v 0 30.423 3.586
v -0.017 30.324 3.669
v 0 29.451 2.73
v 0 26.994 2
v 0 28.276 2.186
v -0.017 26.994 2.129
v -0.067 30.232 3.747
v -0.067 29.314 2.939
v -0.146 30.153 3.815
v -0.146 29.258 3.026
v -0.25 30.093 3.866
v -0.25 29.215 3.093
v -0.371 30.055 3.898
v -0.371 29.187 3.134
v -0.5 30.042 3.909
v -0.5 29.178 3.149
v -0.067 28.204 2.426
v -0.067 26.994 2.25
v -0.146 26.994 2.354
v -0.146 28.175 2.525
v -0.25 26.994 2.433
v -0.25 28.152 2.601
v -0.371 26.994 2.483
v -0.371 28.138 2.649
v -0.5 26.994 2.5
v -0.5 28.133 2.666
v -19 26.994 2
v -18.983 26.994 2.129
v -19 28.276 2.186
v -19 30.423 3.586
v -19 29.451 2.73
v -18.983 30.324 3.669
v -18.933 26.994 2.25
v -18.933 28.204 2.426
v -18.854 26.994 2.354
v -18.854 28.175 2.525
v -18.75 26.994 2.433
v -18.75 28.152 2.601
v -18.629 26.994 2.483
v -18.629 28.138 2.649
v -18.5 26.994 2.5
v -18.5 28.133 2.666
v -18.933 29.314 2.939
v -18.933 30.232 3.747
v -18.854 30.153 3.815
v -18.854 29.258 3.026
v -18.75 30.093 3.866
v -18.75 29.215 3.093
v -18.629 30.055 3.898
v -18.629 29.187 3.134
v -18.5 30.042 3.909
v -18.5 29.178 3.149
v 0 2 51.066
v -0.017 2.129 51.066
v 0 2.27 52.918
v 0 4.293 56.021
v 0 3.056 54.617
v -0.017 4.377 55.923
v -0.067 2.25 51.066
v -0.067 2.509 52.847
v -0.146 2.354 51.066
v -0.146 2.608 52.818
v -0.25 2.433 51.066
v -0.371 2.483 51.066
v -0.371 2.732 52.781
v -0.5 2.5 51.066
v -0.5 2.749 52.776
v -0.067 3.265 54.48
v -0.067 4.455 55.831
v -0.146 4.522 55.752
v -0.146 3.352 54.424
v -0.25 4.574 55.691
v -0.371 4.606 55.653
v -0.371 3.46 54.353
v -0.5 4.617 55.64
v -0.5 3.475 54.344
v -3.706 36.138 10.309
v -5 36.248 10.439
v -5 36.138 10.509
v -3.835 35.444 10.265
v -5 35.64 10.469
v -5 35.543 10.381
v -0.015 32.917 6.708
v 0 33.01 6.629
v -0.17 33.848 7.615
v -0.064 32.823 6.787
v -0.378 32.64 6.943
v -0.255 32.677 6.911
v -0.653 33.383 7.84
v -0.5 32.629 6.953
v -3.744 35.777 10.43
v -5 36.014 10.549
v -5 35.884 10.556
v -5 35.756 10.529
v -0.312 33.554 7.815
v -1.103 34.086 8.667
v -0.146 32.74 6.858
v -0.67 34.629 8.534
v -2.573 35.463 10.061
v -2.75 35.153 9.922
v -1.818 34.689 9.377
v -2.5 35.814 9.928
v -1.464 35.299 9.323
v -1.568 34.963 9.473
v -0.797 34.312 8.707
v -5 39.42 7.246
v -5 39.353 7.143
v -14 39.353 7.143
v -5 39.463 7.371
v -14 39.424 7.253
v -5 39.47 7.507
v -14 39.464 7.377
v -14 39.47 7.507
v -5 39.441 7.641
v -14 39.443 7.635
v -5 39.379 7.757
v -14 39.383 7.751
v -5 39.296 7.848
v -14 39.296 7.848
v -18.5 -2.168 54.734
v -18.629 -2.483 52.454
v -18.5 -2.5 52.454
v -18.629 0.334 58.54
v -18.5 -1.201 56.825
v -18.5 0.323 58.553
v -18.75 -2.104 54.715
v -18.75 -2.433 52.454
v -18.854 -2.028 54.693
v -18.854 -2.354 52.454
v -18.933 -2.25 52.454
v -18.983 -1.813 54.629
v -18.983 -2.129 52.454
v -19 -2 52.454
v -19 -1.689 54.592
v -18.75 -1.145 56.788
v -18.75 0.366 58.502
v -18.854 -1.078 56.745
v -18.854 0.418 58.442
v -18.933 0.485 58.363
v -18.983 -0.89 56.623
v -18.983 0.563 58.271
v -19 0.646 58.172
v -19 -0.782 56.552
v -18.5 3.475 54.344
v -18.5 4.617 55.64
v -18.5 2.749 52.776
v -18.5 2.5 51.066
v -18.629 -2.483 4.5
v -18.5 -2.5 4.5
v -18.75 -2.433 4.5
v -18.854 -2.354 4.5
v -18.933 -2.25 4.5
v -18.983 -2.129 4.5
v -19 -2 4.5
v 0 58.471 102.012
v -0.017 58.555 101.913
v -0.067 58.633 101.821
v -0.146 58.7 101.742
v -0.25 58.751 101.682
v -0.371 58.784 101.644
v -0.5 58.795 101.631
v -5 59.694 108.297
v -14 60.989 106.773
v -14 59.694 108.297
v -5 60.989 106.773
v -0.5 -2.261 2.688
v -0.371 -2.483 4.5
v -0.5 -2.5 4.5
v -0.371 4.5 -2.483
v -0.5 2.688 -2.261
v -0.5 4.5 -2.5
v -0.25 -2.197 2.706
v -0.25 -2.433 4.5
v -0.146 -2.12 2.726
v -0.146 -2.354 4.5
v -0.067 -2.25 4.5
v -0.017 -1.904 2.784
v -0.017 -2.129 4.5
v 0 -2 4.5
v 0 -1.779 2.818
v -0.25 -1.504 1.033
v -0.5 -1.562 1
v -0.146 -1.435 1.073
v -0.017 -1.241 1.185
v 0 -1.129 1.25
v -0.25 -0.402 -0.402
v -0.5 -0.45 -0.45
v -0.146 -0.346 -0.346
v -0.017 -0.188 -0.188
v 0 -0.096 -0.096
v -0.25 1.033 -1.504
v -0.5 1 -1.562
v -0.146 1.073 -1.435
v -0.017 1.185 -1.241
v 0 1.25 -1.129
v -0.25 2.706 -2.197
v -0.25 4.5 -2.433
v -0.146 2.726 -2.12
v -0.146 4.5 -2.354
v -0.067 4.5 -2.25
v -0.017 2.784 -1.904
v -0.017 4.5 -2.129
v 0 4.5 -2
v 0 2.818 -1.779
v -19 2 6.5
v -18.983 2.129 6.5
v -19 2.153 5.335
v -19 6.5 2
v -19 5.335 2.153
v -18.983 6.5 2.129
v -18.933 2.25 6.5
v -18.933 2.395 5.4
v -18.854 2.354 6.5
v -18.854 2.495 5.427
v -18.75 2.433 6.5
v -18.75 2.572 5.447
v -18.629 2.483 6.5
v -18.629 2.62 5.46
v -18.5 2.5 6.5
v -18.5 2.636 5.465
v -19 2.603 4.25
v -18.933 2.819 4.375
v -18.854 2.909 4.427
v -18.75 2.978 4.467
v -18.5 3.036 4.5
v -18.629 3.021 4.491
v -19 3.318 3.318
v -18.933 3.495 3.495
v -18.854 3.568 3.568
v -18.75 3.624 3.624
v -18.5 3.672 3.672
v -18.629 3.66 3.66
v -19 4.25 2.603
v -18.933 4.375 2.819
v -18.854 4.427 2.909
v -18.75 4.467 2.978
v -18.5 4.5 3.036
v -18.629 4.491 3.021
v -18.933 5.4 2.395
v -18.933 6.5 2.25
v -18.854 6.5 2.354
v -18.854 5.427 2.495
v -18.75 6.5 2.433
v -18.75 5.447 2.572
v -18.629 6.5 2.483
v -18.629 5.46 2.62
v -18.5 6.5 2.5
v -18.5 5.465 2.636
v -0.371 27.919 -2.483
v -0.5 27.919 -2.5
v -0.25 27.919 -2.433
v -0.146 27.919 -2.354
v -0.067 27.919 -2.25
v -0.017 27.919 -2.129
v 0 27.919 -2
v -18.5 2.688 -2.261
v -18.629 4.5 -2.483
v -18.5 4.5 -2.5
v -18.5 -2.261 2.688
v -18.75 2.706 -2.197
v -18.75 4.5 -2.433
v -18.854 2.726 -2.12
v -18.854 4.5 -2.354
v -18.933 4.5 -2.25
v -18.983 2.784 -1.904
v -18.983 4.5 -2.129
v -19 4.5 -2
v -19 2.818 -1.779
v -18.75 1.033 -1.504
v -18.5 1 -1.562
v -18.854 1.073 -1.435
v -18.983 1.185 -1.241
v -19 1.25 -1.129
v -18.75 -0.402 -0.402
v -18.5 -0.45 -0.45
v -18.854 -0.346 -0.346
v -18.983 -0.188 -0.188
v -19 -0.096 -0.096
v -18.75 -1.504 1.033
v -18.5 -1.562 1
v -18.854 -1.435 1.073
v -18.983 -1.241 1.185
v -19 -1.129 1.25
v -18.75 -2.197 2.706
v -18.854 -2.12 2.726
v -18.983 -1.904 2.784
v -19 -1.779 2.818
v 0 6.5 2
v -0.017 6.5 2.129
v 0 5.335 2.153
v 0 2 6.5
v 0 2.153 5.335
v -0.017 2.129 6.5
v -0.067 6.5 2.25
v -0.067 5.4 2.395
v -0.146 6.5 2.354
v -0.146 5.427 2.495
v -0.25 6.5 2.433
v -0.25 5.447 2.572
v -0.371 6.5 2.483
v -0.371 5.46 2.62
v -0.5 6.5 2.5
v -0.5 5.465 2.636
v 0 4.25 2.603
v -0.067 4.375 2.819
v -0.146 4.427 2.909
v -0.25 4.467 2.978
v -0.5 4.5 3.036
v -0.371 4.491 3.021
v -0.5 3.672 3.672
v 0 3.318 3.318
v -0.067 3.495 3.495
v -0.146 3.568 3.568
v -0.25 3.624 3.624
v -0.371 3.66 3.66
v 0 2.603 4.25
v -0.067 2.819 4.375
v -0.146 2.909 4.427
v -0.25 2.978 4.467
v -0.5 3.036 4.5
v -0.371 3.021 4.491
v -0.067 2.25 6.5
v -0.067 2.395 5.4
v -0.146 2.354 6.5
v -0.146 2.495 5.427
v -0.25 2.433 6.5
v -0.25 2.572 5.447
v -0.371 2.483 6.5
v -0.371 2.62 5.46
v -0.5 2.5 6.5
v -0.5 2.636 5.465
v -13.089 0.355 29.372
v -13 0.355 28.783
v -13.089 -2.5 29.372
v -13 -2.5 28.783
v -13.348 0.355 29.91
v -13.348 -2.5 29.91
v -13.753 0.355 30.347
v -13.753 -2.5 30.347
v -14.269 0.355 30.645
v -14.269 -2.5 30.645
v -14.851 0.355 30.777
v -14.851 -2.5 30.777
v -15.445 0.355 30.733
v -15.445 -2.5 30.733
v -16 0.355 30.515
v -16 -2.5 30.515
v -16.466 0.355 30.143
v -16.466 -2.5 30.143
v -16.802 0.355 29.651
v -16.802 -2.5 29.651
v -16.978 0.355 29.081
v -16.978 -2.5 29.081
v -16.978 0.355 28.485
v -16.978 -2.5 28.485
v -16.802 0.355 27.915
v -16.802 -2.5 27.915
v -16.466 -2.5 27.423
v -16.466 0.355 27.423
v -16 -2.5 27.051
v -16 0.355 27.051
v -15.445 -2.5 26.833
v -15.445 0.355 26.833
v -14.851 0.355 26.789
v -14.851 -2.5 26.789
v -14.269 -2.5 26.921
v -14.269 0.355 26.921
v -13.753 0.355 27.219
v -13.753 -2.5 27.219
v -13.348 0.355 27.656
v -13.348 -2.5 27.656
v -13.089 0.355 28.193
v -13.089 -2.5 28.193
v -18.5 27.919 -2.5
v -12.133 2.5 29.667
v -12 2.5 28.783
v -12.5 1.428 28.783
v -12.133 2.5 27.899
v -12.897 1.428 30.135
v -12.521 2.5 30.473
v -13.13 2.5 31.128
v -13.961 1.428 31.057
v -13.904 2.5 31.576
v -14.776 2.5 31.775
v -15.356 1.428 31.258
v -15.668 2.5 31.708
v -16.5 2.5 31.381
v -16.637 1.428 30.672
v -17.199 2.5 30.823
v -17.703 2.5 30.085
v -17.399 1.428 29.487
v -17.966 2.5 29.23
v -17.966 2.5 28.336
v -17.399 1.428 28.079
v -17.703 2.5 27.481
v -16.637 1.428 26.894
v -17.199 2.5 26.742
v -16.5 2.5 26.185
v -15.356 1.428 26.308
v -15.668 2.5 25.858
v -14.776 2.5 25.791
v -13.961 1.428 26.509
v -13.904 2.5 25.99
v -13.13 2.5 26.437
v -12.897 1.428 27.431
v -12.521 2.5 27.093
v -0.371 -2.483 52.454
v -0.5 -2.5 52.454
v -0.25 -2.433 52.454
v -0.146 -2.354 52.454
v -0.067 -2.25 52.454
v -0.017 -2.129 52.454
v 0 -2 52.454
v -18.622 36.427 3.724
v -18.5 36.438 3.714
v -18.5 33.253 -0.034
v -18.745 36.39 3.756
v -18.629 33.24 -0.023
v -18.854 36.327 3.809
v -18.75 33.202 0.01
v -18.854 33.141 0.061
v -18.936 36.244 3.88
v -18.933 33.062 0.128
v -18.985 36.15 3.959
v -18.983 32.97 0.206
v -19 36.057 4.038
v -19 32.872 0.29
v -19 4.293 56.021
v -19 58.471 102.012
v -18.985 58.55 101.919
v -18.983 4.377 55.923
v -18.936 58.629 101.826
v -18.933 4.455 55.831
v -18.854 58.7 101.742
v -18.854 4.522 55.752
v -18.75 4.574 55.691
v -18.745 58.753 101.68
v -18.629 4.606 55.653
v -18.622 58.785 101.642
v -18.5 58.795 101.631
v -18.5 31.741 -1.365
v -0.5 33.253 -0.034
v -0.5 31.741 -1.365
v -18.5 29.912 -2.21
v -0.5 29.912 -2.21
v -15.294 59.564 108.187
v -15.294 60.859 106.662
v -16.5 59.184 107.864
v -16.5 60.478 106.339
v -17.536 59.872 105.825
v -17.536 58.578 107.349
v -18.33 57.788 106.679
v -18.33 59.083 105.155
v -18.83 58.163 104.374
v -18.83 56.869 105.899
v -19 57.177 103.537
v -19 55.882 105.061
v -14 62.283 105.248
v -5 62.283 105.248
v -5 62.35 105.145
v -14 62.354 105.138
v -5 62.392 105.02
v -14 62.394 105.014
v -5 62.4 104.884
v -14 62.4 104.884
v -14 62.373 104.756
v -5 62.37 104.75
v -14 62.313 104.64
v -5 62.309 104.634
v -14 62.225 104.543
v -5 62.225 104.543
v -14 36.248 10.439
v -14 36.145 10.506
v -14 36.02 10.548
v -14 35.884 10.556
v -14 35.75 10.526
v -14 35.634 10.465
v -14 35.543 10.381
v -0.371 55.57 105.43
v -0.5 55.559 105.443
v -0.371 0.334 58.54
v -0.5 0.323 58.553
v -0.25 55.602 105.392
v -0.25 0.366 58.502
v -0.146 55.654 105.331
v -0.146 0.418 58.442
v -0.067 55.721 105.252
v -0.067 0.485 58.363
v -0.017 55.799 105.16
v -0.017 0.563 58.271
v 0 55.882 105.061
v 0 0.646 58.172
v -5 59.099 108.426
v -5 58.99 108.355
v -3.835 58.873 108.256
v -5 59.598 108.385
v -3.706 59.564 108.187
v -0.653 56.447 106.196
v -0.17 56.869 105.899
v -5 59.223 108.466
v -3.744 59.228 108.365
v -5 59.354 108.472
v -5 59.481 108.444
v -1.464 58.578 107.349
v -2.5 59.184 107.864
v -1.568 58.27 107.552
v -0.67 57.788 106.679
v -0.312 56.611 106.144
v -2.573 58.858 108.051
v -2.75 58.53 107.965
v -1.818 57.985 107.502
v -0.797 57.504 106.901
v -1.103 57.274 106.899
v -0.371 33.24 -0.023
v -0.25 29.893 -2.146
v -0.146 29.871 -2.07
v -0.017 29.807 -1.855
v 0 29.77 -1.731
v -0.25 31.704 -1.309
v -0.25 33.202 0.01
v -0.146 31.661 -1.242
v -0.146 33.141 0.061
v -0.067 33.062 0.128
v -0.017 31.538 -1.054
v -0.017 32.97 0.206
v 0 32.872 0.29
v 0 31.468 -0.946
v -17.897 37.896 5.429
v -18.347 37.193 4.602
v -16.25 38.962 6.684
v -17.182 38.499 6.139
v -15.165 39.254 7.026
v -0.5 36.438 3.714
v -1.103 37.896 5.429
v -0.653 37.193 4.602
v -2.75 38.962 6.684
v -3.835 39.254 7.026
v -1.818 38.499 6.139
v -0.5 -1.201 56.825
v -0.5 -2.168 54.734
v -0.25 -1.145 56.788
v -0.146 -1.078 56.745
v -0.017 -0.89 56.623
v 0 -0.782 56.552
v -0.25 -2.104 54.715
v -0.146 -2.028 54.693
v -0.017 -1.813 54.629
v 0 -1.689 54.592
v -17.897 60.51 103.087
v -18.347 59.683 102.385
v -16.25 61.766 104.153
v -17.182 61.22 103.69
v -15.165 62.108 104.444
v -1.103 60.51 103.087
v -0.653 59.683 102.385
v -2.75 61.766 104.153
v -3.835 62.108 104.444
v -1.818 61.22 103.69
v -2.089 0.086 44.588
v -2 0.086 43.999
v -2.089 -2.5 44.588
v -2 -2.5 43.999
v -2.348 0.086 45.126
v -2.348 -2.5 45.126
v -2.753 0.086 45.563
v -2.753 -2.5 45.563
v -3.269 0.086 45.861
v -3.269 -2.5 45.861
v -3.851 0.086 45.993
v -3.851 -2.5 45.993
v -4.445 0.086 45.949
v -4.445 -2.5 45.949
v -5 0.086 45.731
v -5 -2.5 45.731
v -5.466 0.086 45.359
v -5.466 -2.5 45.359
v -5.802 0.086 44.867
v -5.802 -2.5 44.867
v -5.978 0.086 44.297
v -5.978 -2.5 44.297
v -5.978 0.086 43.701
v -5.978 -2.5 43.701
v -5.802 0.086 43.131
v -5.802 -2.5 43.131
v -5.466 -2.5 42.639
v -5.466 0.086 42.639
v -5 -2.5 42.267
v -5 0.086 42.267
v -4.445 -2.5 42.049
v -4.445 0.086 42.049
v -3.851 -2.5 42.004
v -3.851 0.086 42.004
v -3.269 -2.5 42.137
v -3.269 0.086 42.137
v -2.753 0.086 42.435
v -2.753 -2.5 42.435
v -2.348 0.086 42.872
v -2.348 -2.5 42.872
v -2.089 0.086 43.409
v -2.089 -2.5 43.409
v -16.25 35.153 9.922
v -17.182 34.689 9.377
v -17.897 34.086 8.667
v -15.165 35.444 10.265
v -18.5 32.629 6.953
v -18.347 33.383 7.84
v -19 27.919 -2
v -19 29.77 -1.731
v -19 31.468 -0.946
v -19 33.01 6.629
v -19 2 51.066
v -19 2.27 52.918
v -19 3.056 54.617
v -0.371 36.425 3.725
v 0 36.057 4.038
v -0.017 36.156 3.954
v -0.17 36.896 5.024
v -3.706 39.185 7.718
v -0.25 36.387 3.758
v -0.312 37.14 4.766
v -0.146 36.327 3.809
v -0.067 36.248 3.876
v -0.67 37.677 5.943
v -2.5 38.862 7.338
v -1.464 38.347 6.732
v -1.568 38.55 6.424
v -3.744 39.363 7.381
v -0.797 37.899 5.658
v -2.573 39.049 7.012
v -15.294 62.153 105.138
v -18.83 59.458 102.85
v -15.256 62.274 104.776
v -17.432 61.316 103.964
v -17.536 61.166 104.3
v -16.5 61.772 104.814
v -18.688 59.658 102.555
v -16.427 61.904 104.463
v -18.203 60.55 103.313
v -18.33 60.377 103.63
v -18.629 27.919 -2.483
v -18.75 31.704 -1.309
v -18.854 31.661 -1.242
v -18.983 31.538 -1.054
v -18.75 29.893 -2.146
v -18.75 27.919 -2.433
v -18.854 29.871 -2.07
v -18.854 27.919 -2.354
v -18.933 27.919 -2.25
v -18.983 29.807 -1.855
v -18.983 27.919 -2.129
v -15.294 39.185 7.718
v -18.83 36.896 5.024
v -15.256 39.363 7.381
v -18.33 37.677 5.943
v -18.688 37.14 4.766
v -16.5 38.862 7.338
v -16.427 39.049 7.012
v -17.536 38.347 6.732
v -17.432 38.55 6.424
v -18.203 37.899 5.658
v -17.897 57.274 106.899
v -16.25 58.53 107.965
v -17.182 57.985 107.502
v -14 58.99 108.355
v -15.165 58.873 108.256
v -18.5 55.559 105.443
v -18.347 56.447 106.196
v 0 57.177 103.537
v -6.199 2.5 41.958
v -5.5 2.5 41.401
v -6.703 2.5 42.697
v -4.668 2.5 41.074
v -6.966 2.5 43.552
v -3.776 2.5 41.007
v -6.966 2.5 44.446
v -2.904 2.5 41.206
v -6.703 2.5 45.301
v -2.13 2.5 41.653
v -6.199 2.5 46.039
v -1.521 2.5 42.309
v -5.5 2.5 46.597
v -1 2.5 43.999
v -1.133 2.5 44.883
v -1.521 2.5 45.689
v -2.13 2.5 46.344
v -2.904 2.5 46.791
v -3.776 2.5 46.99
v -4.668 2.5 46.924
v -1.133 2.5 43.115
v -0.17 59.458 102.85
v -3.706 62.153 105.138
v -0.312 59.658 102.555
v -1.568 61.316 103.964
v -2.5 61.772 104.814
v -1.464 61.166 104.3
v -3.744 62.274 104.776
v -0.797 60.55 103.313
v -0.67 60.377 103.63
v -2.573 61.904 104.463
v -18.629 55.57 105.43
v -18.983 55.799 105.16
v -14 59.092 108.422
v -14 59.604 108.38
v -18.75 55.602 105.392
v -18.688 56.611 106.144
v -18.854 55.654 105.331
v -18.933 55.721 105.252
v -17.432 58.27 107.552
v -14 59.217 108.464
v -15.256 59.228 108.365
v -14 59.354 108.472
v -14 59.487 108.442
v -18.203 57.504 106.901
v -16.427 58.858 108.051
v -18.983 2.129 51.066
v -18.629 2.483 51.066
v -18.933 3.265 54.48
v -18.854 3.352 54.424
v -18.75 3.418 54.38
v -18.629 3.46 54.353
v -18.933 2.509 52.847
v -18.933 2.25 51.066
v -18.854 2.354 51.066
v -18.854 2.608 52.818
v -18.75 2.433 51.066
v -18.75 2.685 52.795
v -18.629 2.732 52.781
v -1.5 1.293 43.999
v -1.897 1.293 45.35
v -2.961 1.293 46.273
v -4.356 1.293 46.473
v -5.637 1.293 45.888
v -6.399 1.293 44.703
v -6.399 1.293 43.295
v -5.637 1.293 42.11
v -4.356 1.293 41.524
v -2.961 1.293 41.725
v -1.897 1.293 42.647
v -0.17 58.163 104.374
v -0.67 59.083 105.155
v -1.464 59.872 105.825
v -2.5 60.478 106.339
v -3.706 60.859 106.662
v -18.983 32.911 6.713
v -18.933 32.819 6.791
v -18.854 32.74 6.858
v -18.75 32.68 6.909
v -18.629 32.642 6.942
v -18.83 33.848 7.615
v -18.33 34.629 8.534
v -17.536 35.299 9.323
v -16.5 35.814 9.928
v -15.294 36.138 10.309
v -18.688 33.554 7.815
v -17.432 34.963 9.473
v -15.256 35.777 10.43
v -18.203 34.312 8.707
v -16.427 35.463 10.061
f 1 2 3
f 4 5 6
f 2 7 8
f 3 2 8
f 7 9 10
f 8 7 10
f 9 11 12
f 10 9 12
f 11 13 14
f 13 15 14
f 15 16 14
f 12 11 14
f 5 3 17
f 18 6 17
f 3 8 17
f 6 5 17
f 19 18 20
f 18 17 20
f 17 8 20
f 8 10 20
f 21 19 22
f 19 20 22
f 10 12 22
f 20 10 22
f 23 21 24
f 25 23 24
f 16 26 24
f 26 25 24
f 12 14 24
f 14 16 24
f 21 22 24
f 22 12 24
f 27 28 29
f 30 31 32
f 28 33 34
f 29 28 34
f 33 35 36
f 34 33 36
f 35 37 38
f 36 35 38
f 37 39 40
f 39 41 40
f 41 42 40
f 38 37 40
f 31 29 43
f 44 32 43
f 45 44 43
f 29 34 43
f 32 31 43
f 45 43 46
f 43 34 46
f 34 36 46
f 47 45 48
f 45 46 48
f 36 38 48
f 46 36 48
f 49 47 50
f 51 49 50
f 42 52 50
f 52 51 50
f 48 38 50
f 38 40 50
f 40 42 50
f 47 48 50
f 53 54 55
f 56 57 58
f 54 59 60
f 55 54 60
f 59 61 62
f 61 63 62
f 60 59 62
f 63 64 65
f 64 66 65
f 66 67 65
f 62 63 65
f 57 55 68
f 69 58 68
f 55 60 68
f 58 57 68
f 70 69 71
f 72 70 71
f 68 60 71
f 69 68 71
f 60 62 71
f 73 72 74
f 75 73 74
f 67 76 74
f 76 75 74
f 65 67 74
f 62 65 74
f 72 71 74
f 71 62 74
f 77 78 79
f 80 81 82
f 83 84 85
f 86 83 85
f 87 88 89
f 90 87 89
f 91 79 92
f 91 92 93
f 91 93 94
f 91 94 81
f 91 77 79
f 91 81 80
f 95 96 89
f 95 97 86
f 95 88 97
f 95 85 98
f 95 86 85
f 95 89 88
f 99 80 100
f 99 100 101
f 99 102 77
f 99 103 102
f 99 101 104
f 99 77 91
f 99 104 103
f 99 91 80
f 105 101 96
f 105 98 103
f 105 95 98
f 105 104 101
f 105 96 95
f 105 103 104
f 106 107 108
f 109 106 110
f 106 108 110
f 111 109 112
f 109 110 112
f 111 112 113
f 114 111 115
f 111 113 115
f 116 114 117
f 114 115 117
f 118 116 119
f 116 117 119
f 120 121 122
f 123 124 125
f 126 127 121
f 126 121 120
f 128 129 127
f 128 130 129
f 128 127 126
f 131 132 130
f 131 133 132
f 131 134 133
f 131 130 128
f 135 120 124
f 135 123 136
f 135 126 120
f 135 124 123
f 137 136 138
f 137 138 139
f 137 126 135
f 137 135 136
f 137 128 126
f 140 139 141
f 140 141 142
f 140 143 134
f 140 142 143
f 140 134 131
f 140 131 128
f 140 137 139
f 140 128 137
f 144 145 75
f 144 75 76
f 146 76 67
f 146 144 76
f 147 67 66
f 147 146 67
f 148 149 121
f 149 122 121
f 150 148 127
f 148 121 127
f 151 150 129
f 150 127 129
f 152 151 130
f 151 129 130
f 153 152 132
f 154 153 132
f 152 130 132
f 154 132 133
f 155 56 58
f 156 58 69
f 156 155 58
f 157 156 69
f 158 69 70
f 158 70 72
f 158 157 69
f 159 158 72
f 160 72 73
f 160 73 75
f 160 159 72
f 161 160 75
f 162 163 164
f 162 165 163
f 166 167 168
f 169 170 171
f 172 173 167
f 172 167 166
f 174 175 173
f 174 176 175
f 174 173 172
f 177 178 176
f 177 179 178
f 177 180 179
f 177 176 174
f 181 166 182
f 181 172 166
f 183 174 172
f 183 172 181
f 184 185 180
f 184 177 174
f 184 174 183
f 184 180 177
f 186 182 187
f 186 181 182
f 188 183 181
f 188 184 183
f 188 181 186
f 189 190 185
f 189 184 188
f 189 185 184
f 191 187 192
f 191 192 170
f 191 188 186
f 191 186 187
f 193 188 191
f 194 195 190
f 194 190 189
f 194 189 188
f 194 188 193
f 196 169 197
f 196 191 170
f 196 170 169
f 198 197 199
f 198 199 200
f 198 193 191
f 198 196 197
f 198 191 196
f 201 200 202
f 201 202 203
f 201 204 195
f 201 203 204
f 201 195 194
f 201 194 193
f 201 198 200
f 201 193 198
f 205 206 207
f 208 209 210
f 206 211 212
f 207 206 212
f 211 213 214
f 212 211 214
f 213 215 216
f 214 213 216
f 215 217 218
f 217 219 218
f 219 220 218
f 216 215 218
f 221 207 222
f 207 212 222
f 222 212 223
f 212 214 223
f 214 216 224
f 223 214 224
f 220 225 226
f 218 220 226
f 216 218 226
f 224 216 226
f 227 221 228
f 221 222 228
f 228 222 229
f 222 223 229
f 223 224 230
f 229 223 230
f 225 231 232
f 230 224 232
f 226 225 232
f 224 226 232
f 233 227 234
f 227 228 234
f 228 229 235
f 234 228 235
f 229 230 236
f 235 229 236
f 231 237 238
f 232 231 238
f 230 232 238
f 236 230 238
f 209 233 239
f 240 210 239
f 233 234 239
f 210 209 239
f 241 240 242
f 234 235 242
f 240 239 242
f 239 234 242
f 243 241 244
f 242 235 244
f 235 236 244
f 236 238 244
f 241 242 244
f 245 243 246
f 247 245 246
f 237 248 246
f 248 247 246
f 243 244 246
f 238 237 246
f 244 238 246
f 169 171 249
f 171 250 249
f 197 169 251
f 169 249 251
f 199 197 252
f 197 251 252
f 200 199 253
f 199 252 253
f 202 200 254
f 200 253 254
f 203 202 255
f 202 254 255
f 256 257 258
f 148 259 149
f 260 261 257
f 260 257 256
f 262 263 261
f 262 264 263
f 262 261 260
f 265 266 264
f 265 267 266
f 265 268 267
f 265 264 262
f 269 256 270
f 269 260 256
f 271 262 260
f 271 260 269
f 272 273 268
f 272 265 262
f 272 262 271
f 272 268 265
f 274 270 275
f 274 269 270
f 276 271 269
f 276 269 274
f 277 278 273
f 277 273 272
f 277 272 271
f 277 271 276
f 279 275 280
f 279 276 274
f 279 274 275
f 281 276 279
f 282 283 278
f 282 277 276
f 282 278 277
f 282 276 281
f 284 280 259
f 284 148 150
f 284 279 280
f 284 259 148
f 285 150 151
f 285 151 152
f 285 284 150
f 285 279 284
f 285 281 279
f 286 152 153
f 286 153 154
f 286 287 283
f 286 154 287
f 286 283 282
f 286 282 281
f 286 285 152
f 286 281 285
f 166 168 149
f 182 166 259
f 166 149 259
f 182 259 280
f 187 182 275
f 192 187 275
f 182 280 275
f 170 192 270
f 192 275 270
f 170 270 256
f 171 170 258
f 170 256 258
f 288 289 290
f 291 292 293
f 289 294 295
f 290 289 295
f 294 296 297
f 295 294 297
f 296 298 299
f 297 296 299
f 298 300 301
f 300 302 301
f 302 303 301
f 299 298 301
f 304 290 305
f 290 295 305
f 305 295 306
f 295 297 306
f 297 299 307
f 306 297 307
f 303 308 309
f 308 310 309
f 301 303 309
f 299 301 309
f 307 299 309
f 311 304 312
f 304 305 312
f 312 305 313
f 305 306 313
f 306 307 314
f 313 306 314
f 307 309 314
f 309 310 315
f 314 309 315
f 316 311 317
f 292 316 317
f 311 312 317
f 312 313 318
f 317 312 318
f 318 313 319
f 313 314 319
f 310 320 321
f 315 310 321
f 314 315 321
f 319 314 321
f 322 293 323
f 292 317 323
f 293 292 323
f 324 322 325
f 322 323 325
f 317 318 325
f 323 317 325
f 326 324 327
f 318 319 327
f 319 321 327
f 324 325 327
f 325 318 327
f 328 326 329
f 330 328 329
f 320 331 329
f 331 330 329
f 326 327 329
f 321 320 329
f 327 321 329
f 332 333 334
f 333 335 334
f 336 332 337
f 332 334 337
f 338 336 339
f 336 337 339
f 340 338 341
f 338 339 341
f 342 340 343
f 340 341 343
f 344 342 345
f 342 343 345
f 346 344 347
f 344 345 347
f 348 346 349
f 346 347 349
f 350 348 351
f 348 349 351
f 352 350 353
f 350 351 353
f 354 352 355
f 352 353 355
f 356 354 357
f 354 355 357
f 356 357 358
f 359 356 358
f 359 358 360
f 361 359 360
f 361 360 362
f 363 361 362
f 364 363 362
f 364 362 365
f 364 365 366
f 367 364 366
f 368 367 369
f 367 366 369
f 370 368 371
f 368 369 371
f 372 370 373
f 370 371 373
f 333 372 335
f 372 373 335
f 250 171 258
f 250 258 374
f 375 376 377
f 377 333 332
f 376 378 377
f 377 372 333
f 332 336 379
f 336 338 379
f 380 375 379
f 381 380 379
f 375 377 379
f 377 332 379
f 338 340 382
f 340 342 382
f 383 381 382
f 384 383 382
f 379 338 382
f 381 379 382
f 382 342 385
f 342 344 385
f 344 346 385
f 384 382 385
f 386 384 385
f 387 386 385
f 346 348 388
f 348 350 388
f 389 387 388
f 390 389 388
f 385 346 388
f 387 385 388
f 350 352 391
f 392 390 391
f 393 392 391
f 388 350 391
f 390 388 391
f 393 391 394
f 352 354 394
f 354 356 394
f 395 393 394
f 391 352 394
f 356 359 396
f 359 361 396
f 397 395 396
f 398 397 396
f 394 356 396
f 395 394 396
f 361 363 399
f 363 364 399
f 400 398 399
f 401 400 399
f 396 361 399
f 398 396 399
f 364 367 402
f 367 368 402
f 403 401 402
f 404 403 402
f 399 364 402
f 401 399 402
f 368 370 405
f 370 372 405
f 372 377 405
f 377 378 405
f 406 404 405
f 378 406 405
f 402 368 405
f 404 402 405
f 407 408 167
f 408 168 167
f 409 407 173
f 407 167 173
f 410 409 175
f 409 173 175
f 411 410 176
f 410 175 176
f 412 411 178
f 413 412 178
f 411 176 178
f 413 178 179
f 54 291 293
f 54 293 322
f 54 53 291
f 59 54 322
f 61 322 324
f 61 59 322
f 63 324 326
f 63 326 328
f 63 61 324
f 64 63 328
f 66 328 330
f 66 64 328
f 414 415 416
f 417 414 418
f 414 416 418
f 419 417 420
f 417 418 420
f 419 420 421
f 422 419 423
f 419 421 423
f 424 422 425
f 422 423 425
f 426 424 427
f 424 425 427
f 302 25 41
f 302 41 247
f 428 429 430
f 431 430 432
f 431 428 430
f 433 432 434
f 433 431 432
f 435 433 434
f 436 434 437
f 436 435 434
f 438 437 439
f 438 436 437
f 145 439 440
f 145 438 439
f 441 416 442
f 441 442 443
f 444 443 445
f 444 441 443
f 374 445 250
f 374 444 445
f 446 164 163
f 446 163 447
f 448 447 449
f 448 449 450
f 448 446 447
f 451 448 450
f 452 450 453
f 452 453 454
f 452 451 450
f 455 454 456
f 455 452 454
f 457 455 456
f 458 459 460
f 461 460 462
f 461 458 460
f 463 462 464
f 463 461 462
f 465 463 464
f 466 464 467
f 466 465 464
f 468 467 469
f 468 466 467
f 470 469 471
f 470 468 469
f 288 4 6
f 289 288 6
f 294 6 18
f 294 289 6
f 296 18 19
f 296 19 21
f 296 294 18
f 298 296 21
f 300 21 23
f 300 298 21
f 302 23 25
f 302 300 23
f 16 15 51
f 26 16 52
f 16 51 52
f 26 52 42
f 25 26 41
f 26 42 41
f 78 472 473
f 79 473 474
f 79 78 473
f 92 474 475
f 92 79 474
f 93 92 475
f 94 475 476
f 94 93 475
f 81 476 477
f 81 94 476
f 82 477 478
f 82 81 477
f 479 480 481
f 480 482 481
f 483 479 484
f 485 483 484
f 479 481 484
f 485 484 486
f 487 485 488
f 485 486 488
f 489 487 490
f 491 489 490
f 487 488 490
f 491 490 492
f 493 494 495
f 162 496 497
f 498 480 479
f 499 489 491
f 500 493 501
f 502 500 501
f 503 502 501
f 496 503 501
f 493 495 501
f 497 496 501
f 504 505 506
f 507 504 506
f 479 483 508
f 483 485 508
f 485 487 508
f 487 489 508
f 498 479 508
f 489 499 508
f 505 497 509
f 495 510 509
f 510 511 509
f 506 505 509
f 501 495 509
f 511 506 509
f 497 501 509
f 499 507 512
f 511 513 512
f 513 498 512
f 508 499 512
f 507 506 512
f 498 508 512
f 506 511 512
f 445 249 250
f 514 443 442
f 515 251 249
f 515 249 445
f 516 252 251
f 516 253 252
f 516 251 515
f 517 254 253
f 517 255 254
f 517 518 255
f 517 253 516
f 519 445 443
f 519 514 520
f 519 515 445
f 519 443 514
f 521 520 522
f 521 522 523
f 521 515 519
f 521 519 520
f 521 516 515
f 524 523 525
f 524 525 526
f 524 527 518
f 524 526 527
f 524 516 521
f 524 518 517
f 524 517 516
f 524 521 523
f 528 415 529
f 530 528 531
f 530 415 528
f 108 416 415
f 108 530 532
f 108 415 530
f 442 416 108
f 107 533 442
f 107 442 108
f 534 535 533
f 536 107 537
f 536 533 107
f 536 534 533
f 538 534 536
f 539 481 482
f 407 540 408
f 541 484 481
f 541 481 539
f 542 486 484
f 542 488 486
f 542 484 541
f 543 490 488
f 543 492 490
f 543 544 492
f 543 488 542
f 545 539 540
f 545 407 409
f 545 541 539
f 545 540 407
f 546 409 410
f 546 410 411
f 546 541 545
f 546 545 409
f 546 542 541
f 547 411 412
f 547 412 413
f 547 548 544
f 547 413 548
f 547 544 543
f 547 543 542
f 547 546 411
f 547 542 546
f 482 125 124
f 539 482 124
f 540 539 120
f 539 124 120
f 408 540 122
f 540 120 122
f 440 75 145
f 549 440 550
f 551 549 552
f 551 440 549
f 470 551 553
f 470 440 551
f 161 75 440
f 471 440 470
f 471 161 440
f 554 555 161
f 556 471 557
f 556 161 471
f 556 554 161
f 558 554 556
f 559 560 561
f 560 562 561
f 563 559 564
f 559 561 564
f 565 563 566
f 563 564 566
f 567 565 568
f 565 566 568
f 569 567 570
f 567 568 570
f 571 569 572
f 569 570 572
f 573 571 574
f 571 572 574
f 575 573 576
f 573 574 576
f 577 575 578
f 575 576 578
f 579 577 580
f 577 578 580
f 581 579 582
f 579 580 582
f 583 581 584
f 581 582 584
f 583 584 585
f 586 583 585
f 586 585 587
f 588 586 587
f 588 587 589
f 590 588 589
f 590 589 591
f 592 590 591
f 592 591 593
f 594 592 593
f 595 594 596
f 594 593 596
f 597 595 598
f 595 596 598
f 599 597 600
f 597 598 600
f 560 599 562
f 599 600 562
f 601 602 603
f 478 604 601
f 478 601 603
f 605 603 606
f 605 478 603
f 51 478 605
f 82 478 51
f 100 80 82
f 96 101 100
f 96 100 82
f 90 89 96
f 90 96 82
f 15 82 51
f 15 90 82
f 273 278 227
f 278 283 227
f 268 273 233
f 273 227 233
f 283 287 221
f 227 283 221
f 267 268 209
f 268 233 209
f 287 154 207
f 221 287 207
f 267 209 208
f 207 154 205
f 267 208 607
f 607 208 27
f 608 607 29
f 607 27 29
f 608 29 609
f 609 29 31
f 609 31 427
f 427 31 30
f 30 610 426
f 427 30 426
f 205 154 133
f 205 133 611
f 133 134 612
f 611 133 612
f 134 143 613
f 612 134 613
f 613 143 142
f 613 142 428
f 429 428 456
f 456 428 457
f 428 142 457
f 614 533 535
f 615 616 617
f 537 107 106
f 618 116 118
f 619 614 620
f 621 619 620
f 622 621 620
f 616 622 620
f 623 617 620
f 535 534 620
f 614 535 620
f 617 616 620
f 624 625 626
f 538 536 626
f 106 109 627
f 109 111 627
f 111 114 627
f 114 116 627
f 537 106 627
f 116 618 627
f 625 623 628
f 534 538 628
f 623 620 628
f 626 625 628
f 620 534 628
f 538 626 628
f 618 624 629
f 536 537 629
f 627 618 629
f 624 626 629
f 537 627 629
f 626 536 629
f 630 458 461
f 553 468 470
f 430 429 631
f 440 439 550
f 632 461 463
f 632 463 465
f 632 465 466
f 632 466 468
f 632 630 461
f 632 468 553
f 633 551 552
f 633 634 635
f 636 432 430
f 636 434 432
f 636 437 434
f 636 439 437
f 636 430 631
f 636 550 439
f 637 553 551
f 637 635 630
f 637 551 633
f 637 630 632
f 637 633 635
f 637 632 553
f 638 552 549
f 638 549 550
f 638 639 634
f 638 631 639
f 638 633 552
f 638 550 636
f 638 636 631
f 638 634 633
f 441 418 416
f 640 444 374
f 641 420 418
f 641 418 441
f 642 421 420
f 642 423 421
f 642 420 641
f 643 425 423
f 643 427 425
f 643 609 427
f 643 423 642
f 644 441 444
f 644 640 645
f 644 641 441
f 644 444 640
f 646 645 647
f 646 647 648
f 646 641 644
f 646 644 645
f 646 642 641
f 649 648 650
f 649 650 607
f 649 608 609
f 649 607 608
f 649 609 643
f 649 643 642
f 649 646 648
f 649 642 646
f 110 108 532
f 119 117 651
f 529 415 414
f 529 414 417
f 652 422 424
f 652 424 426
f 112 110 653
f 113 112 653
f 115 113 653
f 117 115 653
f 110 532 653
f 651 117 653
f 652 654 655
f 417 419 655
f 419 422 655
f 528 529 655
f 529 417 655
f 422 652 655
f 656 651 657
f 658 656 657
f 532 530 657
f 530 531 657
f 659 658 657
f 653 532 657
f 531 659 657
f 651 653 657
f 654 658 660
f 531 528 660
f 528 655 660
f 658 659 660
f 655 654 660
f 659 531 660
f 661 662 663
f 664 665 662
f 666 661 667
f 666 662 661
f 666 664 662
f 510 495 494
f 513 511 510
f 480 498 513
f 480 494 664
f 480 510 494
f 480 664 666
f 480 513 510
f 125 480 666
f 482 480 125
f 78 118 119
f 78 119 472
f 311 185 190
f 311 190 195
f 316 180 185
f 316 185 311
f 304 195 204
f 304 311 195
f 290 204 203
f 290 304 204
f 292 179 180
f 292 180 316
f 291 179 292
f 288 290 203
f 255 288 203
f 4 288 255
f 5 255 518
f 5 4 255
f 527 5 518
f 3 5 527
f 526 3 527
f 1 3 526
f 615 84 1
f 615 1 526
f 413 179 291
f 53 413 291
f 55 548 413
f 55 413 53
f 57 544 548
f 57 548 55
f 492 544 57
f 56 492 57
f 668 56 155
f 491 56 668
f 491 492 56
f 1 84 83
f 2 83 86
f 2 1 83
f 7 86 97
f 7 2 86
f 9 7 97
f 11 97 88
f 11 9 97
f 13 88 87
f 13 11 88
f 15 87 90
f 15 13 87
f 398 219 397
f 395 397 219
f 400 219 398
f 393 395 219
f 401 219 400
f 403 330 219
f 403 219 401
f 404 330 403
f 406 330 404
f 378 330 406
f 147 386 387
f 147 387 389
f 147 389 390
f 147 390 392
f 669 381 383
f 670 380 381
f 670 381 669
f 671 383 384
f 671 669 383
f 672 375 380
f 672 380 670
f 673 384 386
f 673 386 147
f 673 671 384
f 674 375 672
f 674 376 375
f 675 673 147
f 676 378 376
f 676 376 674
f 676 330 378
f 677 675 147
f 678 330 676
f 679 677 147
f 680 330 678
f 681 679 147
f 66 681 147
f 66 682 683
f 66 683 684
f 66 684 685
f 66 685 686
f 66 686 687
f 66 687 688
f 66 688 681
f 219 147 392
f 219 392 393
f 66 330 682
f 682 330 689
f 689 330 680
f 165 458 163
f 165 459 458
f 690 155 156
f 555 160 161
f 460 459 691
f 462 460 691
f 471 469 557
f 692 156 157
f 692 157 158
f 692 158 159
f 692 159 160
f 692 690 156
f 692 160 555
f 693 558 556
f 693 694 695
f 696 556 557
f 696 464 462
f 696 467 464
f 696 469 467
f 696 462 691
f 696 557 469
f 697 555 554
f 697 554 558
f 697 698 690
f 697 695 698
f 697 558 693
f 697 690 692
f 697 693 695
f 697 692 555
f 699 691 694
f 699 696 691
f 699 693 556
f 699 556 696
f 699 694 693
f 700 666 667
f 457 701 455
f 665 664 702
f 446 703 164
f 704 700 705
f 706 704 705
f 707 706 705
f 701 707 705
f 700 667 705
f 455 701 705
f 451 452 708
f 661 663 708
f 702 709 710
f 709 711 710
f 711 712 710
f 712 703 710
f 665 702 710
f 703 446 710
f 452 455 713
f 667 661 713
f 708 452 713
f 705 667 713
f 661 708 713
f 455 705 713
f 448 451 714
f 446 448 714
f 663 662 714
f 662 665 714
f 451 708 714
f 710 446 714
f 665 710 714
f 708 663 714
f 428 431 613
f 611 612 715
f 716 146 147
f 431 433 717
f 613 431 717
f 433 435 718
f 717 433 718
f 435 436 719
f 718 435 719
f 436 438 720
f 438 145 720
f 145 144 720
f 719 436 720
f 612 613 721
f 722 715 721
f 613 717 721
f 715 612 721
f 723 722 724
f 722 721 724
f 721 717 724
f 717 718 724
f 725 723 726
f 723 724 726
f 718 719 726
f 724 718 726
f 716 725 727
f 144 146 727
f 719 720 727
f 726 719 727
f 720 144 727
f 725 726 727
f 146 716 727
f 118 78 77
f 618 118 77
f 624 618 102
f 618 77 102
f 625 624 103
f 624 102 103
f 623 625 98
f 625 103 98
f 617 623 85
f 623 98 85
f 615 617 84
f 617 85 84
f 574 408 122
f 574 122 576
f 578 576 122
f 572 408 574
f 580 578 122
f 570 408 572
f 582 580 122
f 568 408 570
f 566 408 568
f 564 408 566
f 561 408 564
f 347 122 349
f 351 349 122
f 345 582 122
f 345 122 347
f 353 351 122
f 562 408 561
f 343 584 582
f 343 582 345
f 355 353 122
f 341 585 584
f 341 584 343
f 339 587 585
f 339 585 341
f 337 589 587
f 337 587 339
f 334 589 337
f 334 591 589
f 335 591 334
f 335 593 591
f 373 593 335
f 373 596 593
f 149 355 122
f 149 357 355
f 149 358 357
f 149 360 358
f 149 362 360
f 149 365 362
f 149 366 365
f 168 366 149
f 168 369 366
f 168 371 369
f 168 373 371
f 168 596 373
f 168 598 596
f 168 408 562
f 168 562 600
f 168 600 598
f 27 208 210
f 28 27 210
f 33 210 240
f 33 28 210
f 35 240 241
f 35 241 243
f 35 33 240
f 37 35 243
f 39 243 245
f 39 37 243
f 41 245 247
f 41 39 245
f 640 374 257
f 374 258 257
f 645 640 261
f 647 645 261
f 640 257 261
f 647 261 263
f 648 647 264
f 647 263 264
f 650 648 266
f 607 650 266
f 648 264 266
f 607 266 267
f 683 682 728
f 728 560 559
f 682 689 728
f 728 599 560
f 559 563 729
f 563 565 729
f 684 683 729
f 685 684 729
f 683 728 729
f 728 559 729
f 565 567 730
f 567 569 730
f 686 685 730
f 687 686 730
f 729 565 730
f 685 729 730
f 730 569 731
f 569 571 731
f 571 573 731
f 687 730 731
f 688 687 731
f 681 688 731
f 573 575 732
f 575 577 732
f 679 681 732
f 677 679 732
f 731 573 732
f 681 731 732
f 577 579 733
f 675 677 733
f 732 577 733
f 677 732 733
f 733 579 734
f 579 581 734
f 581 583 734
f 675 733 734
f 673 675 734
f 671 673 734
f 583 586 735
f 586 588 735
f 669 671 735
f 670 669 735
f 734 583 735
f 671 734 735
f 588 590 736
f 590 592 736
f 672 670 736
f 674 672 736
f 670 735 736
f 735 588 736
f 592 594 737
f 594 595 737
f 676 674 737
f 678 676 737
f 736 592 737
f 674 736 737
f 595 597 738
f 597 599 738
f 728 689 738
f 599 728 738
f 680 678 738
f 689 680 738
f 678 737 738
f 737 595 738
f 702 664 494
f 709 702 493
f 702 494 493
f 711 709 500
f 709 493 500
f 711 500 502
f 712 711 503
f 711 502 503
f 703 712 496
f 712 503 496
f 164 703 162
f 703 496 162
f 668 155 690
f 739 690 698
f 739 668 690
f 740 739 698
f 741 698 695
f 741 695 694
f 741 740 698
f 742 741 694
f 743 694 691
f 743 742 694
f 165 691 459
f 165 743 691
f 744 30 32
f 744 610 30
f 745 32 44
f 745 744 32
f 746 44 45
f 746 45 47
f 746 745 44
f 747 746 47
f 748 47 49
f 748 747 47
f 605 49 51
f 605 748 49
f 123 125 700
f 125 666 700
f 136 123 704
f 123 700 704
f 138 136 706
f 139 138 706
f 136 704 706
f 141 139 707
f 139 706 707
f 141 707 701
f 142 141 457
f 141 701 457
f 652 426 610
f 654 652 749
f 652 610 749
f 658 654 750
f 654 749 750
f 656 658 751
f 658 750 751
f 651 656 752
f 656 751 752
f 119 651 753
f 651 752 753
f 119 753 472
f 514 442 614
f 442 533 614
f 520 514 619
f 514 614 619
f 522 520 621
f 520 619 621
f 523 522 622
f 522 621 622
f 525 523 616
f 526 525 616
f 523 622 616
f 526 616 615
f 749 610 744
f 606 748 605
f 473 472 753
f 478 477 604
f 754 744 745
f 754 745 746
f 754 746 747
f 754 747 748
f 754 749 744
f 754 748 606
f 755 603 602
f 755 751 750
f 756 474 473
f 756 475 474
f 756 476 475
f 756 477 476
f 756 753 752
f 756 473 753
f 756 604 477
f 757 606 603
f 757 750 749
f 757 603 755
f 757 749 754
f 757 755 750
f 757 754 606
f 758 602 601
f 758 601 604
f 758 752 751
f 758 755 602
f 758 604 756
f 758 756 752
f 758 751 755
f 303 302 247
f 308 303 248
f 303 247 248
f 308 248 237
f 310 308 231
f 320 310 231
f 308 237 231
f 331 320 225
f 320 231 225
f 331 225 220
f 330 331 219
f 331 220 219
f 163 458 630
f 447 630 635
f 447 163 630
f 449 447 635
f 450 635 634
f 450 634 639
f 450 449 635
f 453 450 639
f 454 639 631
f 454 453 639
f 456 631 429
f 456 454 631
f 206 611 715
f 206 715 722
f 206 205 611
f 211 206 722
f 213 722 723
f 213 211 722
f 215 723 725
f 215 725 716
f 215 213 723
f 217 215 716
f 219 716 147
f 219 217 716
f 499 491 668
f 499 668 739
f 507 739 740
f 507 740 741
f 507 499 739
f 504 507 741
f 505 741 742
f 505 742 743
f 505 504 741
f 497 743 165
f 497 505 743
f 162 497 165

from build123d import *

# Parameters (mm, degrees)
F1_DEPTH        = 19
F2_R            = 8
F3_R            = 6
F4_R            = 7
F5_R            = 4
F6_R            = 7
F7_R            = 4
F8_R            = 5
F9_R            = 5
F10_R           = 5
F11_R           = 5
F13_D           = 4
F13_CSINK_D     = 6
F13_CSINK_ANGLE = 45
F15_D           = 4
F15_CSINK_D     = 6
F15_CSINK_ANGLE = 50
F16_R           = 0.5
F17_R           = 0.5


with BuildPart() as f1:
    # F0 (on Right) → F1 (new body)
    with BuildSketch(Plane.YZ):
        Polygon((39.676629, 7.524151), (37.771781, 9.143272), (35.866933, 10.762393), (28.843899, 2.5), (2.5, 2.5), (2.5, 53.842919), (62.606462, 104.866631), (60.988571, 106.772524), (59.370679, 108.678417), (-2.5, 56.157081), (-2.5, -2.5), (0, -2.5), (31.156101, -2.5), align=None)
    extrude(amount=-F1_DEPTH)

    # F2
    f2_edges = [f1.edges().sort_by_distance(p)[0] for p in [
        (-9.5, -2.5, 56.157081),
    ]]
    fillet(f2_edges, radius=F2_R)

    # F3
    f3_edges = [f1.edges().sort_by_distance(p)[0] for p in [
        (-9.5, 2.5, 53.842919),
    ]]
    fillet(f3_edges, radius=F3_R)

    # F4
    f4_edges = [f1.edges().sort_by_distance(p)[0] for p in [
        (-9.5, -2.5, -2.5),
    ]]
    fillet(f4_edges, radius=F4_R)

    # F5
    f5_edges = [f1.edges().sort_by_distance(p)[0] for p in [
        (-9.5, 2.5, 2.5),
    ]]
    fillet(f5_edges, radius=F5_R)

    # F6
    f6_edges = [f1.edges().sort_by_distance(p)[0] for p in [
        (-9.5, 31.156101, -2.5),
    ]]
    fillet(f6_edges, radius=F6_R)

    # F7
    f7_edges = [f1.edges().sort_by_distance(p)[0] for p in [
        (-9.5, 28.843899, 2.5),
    ]]
    fillet(f7_edges, radius=F7_R)

    # F8
    f8_edges = [f1.edges().sort_by_distance(p)[0] for p in [
        (0, 60.988571, 106.772524),
    ]]
    fillet(f8_edges, radius=F8_R)

    # F9
    f9_edges = [f1.edges().sort_by_distance(p)[0] for p in [
        (-19, 60.988571, 106.772524),
    ]]
    fillet(f9_edges, radius=F9_R)

    # F10
    f10_edges = [f1.edges().sort_by_distance(p)[0] for p in [
        (-19, 37.771781, 9.143272),
    ]]
    fillet(f10_edges, radius=F10_R)

    # F11
    f11_edges = [f1.edges().sort_by_distance(p)[0] for p in [
        (0, 37.771781, 9.143272),
    ]]
    fillet(f11_edges, radius=F11_R)

    # F13 (through all)
    with Locations(Plane(origin=(0, 2.5, 0), x_dir=(-1, 0, 0), z_dir=(0, 1, 0))):
        with Locations((4, 43.998878)):
            CounterSinkHole(F13_D / 2, F13_CSINK_D / 2, counter_sink_angle=F13_CSINK_ANGLE)

    # F15 (through all)
    with Locations(Plane(origin=(0, 2.5, 0), x_dir=(-1, 0, 0), z_dir=(0, 1, 0))):
        with Locations((15, 28.782963)):
            CounterSinkHole(F15_D / 2, F15_CSINK_D / 2, counter_sink_angle=F15_CSINK_ANGLE)

    # F16
    f16_edges = [f1.edges().sort_by_distance(p)[0] for p in [
        (0, 27.940821, 81.997957),
    ]]
    fillet(f16_edges, radius=F16_R)

    # F17
    f17_edges = [f1.edges().sort_by_distance(p)[0] for p in [
        (0, 31.705869, 78.635459),
    ]]
    fillet(f17_edges, radius=F17_R)


solid = f1.part
